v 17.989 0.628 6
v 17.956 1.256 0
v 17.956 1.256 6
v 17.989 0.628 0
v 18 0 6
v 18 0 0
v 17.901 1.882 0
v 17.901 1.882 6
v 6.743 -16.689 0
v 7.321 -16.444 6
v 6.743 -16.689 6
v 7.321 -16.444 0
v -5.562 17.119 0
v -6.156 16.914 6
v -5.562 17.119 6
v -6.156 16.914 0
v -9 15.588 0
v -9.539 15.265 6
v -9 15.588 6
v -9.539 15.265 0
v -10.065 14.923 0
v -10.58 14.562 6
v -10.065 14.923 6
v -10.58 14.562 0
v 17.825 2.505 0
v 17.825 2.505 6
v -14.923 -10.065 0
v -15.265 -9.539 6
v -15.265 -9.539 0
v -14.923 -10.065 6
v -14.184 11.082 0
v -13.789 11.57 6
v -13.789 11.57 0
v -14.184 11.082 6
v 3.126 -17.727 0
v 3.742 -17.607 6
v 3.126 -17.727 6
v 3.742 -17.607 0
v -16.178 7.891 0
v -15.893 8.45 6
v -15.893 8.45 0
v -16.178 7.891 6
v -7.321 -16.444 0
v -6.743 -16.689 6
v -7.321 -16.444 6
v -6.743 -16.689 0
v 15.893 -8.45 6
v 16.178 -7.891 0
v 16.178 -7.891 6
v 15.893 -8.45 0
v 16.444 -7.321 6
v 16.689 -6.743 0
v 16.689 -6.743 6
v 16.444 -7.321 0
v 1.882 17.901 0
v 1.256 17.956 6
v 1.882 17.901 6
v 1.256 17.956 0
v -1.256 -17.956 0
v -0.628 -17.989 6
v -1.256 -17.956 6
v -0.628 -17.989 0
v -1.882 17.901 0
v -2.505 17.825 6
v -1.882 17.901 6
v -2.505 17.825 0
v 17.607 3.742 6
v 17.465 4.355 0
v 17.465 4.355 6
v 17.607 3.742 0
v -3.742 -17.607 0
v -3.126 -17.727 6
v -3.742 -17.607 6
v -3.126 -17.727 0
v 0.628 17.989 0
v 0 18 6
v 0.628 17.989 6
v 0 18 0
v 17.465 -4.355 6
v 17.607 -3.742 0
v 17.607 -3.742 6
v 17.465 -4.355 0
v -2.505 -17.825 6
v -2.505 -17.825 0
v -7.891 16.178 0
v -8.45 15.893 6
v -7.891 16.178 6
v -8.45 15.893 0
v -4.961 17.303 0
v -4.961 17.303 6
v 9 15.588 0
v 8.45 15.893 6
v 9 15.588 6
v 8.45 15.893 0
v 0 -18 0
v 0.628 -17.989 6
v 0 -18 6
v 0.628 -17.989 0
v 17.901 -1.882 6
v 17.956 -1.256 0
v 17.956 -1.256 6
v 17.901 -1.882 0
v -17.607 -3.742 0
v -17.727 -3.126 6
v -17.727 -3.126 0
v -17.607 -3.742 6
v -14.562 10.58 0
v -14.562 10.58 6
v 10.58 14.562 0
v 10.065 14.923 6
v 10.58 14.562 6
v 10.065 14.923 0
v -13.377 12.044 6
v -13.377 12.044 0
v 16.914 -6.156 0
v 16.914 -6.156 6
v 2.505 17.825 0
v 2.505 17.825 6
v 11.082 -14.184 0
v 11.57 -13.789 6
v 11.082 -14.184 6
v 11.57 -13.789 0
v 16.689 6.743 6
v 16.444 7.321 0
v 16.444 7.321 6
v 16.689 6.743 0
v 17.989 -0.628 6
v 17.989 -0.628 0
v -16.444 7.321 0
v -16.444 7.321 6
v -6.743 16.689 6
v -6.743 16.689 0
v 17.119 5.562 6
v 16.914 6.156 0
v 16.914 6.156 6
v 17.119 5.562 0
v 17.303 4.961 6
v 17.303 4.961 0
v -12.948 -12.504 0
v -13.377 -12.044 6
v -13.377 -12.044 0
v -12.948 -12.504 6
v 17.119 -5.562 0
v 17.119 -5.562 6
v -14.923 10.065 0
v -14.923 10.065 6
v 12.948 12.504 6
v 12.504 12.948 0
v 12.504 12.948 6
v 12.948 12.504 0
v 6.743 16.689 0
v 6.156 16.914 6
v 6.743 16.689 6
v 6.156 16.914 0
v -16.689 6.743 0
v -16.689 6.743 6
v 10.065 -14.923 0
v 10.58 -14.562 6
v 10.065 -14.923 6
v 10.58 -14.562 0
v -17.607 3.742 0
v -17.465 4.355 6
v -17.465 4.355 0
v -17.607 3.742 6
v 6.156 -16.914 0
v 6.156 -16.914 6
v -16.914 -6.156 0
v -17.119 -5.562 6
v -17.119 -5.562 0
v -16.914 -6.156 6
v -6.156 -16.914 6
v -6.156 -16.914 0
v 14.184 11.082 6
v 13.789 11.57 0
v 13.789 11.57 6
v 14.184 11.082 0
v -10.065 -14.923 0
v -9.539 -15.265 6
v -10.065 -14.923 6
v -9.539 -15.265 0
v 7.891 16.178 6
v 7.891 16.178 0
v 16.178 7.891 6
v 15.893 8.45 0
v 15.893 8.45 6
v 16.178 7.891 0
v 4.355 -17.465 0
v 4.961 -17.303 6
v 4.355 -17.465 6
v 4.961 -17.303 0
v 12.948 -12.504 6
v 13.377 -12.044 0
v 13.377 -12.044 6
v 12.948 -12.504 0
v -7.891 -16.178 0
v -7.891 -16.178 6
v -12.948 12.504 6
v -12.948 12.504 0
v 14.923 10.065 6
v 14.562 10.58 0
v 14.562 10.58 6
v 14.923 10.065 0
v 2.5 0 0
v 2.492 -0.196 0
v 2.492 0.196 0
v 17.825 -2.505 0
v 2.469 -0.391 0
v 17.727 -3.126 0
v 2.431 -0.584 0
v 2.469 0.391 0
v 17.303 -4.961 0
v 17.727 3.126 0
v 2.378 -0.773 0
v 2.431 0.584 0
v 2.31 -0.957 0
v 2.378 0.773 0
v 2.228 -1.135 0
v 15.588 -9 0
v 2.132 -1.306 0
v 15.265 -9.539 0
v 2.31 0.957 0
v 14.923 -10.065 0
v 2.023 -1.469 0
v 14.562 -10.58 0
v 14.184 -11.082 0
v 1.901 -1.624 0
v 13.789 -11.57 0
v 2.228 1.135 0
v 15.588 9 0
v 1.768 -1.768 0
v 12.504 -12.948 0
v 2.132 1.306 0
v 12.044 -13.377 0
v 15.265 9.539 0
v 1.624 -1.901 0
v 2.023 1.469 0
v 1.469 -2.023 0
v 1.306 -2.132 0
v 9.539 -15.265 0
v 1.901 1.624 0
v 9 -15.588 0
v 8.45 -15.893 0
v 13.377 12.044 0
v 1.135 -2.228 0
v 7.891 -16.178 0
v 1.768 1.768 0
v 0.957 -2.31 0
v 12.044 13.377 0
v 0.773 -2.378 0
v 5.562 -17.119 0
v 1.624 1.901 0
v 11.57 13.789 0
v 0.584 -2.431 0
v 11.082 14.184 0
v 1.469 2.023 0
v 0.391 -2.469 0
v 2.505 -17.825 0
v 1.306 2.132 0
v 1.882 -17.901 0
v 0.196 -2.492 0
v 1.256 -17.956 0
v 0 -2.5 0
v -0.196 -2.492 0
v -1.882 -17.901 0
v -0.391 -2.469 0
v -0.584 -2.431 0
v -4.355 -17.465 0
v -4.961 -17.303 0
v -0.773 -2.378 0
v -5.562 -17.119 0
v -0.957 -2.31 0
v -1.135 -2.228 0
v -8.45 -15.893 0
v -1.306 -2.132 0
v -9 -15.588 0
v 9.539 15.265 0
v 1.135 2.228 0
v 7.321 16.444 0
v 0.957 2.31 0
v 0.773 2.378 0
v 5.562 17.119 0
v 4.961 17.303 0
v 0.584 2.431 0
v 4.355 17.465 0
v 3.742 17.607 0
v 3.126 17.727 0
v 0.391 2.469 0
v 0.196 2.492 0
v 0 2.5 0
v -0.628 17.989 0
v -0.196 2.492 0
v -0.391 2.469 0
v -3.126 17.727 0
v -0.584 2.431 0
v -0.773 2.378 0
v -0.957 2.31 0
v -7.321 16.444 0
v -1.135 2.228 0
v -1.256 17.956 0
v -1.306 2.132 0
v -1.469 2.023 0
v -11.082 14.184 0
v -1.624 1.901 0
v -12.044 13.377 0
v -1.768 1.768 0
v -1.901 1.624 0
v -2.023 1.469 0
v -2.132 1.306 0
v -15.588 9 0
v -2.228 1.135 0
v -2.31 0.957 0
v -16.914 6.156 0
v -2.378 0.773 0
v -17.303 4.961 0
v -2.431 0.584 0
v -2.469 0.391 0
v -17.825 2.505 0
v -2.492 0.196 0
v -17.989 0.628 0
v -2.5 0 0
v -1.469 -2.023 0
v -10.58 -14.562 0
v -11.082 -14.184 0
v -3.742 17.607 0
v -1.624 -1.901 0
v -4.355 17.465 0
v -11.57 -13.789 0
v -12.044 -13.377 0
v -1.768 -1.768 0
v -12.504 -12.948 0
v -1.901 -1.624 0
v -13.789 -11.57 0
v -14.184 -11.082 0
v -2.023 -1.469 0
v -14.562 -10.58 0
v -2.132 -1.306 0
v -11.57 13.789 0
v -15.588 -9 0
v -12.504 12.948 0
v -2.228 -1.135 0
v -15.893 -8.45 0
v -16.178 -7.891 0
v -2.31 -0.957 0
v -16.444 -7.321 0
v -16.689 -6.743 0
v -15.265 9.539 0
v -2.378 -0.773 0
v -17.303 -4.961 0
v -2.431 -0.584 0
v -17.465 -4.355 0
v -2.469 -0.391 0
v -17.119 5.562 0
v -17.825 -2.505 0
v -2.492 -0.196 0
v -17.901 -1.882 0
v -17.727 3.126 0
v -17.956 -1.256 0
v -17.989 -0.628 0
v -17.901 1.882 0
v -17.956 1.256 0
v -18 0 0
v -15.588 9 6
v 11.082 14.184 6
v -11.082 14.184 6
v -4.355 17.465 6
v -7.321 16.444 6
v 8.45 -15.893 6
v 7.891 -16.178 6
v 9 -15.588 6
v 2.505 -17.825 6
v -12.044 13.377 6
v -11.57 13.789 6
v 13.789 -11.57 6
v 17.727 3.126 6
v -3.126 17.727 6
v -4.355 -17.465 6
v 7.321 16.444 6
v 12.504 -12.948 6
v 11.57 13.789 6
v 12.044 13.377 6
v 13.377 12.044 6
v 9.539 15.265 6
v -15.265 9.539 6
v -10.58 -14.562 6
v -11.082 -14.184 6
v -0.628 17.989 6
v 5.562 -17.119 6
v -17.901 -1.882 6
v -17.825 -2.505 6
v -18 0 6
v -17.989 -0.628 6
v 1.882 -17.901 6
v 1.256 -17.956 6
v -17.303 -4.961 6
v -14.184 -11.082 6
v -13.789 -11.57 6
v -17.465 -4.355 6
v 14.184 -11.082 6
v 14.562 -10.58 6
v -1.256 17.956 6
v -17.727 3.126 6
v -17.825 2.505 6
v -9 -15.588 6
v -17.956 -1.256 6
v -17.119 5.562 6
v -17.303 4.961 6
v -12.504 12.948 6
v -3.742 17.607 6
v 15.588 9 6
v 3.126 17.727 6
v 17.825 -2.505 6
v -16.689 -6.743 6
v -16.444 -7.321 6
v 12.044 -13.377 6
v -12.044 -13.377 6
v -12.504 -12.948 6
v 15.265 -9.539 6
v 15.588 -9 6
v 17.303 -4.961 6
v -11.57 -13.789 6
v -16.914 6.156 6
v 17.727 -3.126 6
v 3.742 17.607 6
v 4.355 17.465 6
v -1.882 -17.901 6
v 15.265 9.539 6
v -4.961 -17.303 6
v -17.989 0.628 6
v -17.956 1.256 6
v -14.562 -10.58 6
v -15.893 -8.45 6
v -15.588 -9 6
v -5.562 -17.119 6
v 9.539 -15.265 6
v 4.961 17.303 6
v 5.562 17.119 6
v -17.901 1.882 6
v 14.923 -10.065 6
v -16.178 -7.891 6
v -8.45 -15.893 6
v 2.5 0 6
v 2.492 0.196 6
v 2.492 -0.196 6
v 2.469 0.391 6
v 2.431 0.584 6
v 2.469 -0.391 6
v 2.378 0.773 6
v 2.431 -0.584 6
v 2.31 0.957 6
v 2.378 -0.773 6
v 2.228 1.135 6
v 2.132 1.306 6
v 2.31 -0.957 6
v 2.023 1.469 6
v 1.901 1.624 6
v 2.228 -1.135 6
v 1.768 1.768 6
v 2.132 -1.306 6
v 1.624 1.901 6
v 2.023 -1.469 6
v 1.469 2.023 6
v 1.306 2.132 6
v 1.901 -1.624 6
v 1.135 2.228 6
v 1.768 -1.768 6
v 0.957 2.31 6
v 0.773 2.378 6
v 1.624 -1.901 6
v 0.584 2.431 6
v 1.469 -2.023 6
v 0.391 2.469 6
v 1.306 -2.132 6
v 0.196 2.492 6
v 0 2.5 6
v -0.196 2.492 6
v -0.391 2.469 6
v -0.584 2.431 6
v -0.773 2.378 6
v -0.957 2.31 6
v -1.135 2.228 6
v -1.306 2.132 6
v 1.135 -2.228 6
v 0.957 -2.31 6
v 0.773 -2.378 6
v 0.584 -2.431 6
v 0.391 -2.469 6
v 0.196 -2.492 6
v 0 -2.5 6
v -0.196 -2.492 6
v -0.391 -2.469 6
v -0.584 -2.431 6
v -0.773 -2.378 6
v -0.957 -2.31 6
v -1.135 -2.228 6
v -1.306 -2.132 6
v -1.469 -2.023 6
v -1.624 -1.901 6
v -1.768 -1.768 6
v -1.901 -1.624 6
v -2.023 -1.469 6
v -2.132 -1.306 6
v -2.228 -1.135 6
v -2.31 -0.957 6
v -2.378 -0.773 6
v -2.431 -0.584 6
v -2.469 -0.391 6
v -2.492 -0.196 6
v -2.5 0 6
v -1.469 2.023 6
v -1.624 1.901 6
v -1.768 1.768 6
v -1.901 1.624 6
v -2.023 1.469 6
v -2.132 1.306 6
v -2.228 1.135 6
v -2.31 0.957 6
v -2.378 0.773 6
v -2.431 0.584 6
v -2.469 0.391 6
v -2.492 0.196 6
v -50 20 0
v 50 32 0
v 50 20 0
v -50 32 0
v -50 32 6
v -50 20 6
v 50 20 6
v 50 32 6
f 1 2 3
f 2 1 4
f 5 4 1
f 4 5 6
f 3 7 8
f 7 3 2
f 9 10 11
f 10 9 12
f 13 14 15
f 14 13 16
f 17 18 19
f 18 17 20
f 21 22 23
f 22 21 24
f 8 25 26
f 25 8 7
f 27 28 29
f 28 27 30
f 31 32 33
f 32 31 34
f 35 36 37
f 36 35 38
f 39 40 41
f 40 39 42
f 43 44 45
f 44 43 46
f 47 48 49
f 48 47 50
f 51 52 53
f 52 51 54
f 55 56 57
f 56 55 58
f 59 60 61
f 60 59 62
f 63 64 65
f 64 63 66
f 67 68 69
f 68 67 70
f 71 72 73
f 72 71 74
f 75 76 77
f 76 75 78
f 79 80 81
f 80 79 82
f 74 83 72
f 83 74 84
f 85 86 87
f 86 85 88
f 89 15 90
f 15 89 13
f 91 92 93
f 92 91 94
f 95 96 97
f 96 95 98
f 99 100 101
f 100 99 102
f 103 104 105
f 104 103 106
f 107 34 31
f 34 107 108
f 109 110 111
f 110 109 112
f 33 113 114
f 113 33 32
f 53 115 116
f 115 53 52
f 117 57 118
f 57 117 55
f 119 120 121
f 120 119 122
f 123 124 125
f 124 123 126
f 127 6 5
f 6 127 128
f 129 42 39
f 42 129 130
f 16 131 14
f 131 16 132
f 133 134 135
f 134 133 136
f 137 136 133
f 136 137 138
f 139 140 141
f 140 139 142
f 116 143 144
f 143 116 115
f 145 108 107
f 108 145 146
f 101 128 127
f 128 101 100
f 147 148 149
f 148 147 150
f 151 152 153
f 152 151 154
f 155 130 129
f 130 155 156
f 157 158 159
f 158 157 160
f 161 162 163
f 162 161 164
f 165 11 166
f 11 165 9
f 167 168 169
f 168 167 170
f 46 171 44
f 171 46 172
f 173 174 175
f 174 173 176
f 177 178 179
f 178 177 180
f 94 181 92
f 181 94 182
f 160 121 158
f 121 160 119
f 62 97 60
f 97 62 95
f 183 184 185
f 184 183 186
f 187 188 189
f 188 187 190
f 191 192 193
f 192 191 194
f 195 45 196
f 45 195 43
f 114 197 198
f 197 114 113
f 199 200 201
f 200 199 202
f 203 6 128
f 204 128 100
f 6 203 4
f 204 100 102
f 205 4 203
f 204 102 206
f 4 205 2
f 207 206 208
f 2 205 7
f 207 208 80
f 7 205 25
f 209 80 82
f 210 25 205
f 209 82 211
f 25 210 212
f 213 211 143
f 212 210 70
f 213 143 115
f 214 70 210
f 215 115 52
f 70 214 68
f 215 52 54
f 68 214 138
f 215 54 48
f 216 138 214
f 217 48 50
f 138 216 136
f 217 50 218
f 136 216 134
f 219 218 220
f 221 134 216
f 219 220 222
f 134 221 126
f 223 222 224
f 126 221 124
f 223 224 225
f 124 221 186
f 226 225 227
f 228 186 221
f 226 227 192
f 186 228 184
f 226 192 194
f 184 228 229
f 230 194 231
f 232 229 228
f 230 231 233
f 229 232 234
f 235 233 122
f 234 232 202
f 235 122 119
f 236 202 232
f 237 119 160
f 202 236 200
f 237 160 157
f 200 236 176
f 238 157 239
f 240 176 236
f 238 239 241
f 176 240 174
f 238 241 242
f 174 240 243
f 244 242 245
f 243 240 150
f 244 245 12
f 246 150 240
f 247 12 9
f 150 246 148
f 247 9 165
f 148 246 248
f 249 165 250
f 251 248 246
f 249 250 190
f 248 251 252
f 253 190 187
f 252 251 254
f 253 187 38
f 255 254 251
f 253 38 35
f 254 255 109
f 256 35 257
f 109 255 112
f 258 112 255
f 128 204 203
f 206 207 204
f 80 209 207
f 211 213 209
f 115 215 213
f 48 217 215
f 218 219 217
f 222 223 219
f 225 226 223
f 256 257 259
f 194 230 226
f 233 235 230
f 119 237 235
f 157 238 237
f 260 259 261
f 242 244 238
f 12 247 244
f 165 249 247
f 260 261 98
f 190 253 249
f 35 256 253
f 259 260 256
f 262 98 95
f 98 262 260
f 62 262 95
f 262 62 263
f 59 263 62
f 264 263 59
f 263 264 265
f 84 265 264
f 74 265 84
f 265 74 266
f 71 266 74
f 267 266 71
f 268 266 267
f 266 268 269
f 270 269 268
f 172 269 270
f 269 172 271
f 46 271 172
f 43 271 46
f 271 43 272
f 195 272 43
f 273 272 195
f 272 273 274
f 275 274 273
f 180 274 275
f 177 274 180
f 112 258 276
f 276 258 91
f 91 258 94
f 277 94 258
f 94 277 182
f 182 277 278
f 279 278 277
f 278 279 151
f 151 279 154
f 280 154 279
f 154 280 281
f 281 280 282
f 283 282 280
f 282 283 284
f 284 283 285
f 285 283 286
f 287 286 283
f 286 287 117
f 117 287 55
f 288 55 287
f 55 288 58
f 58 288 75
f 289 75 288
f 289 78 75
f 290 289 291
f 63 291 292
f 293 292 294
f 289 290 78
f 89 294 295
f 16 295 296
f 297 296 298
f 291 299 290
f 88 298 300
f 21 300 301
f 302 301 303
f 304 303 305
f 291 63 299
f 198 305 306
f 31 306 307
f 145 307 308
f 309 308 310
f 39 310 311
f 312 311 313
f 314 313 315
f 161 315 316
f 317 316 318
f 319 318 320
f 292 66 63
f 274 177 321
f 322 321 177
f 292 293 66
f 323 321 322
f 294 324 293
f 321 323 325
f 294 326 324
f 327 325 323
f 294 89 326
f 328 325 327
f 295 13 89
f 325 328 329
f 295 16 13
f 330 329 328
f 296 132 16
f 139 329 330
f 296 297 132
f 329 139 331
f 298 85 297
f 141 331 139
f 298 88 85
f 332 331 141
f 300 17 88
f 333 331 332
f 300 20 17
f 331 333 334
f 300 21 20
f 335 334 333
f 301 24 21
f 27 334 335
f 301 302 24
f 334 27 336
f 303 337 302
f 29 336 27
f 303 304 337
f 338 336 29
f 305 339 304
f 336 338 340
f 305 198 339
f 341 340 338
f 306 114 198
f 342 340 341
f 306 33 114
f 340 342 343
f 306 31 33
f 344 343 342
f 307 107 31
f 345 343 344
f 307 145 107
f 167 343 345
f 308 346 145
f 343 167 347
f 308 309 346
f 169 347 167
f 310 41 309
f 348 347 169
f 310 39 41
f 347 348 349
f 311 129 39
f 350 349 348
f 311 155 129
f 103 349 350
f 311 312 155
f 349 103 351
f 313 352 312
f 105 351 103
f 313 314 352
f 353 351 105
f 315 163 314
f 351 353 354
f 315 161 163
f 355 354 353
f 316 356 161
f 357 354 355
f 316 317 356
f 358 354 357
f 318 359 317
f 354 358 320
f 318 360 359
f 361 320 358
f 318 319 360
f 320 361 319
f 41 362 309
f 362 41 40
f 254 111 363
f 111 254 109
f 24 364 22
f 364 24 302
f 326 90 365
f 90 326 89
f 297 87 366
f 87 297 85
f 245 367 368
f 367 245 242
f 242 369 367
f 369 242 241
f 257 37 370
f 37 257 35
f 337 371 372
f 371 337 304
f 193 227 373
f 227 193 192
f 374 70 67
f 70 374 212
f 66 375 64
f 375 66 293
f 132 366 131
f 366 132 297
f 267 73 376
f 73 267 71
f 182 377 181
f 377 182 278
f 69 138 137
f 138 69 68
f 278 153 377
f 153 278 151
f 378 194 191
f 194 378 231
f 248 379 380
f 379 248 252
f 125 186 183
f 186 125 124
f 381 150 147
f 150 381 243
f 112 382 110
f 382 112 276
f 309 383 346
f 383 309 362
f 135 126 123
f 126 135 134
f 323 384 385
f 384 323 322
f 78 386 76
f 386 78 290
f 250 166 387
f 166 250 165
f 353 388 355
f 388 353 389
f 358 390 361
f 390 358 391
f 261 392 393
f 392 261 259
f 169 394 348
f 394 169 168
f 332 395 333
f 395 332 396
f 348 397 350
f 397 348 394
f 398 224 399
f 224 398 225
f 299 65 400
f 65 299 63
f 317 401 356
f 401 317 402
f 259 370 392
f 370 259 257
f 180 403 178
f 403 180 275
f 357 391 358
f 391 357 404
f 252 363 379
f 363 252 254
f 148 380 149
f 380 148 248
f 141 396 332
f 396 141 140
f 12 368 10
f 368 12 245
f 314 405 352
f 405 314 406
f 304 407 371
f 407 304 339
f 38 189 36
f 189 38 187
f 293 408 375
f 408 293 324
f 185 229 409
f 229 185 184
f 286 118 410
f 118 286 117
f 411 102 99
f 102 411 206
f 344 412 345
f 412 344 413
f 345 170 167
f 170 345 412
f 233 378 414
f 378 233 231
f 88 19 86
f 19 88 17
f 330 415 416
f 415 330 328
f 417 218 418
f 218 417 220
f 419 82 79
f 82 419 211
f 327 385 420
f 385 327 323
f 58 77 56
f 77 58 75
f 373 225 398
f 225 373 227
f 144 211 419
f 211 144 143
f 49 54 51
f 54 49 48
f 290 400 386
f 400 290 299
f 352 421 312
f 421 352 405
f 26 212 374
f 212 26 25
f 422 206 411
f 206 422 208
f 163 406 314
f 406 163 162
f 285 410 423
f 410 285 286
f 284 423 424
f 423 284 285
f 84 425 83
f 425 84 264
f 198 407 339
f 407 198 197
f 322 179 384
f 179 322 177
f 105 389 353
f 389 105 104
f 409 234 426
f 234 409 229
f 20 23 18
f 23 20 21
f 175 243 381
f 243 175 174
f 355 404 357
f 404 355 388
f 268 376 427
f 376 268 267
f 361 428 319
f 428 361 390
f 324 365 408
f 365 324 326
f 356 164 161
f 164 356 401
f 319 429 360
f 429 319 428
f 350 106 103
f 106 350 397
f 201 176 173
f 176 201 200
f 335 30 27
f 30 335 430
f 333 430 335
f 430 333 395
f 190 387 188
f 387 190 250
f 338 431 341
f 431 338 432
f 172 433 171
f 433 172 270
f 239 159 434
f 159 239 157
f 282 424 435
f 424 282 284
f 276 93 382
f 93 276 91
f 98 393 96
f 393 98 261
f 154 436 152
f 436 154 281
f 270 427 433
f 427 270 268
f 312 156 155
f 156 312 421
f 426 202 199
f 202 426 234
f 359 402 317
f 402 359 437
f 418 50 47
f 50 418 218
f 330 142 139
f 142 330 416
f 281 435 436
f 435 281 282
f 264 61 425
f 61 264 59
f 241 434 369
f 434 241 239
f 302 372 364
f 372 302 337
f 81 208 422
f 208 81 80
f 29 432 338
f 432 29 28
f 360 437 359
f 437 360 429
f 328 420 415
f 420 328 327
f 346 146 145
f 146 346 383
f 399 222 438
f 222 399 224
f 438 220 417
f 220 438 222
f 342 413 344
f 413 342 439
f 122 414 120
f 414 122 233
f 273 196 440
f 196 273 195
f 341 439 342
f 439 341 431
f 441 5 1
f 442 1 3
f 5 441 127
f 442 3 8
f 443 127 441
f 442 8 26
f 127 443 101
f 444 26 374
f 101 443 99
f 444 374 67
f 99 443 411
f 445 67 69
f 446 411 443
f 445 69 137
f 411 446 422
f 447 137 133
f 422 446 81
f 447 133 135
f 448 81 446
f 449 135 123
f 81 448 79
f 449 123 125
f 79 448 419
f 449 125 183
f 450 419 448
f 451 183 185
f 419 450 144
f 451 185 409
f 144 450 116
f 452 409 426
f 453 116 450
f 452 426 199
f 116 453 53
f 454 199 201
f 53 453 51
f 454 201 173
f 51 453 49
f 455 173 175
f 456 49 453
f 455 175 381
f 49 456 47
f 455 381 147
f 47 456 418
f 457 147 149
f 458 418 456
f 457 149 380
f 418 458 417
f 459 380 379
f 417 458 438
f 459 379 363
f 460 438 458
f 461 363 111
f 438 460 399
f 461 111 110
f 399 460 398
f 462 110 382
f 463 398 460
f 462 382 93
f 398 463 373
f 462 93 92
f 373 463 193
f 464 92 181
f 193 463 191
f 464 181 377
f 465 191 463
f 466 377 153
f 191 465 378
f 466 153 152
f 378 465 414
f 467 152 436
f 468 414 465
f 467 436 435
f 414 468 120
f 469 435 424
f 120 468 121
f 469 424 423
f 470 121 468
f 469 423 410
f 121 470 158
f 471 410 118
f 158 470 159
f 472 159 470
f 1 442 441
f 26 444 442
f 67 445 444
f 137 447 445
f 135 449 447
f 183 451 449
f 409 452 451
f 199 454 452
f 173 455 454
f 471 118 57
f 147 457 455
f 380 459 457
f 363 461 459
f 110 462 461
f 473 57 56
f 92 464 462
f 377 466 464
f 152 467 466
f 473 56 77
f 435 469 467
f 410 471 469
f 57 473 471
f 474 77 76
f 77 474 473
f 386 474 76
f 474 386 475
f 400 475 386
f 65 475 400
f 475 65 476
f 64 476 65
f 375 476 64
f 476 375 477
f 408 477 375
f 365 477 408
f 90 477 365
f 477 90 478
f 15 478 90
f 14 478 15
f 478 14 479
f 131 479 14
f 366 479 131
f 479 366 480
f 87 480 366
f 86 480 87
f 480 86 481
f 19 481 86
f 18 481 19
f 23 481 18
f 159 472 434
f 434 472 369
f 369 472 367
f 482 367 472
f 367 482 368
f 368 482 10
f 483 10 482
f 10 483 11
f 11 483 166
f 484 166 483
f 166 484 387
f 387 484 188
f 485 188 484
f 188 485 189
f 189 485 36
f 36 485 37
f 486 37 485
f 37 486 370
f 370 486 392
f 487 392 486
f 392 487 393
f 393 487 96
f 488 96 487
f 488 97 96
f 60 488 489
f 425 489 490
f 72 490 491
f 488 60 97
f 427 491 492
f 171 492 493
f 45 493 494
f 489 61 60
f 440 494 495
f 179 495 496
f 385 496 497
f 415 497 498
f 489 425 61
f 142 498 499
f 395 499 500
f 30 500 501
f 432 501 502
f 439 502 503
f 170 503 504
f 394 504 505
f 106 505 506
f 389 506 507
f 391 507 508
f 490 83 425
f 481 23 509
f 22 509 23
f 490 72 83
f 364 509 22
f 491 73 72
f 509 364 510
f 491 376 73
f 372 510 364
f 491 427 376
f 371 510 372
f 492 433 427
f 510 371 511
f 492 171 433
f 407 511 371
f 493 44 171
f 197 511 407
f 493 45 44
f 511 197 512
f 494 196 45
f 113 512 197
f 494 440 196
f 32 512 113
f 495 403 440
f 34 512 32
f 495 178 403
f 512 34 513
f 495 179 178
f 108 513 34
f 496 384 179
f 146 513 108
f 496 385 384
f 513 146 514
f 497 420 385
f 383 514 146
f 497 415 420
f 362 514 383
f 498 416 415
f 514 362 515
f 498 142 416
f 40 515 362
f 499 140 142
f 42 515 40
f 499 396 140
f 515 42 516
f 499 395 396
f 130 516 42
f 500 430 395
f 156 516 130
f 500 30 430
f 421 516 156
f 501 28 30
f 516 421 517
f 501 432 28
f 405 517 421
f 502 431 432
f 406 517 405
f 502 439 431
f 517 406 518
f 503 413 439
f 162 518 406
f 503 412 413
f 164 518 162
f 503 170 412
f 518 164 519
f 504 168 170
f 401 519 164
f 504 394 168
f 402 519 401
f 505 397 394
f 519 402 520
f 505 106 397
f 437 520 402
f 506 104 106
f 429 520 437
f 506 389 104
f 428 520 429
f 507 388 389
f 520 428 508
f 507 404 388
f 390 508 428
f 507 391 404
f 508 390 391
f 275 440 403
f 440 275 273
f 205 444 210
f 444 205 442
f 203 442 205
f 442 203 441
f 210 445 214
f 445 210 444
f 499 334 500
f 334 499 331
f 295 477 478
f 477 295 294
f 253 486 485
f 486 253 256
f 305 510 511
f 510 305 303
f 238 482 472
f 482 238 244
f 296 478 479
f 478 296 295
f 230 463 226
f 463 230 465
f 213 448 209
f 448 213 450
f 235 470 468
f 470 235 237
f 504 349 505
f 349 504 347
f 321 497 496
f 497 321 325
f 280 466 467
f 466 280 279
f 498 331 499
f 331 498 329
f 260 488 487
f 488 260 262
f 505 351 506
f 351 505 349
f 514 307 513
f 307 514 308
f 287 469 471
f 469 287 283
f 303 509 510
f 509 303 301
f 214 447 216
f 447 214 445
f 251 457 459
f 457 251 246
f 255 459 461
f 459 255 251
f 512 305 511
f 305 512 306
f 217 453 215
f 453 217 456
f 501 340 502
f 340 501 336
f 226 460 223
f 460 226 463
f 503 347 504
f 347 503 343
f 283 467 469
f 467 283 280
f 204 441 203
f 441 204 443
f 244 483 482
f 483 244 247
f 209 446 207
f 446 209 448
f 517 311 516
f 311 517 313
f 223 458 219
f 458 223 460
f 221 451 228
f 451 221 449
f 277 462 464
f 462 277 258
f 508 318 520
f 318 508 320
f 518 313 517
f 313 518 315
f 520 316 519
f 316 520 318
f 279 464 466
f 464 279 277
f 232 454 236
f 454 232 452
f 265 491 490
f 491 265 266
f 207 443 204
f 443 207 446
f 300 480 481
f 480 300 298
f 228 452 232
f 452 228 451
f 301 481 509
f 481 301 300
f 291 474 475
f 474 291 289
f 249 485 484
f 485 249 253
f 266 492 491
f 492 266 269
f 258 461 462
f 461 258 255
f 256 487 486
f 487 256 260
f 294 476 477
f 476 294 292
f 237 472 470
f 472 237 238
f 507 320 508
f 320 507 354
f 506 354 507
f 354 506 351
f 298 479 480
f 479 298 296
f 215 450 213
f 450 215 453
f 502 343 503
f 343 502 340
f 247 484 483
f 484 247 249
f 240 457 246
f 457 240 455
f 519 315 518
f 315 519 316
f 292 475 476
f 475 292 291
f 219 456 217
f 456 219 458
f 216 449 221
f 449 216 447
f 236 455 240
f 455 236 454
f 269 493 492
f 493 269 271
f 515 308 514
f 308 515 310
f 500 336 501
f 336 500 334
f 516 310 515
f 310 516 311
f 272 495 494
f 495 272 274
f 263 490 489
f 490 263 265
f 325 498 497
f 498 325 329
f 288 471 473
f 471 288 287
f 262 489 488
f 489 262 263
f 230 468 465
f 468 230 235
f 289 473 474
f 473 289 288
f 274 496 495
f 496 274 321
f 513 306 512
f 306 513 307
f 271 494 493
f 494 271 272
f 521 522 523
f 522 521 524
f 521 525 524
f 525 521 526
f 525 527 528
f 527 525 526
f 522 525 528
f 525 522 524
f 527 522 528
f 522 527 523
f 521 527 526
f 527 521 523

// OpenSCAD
/*
  Rack & pinion teaching model (rack is a flat rail; pinion is a gear blank).
*/
module_mm = 2.0;
teeth_pinion = 16;
thickness = 6;
bore = 5;
rack_teeth = 40;
$fn=120;

module pinion(){
  difference(){
    cylinder(h=thickness, r=(module_mm*teeth_pinion/2)+module_mm, $fn=180);
    translate([0,0,-1]) cylinder(h=thickness+2, r=bore/2, $fn=80);
  }
}

module rack(){
  linear_extrude(height=thickness)
    square([module_mm*rack_teeth*1.25, 12], center=false);
}

translate([0,0,0]) pinion();
translate([-(module_mm*rack_teeth*1.25)/2, 20, 0]) rack();
